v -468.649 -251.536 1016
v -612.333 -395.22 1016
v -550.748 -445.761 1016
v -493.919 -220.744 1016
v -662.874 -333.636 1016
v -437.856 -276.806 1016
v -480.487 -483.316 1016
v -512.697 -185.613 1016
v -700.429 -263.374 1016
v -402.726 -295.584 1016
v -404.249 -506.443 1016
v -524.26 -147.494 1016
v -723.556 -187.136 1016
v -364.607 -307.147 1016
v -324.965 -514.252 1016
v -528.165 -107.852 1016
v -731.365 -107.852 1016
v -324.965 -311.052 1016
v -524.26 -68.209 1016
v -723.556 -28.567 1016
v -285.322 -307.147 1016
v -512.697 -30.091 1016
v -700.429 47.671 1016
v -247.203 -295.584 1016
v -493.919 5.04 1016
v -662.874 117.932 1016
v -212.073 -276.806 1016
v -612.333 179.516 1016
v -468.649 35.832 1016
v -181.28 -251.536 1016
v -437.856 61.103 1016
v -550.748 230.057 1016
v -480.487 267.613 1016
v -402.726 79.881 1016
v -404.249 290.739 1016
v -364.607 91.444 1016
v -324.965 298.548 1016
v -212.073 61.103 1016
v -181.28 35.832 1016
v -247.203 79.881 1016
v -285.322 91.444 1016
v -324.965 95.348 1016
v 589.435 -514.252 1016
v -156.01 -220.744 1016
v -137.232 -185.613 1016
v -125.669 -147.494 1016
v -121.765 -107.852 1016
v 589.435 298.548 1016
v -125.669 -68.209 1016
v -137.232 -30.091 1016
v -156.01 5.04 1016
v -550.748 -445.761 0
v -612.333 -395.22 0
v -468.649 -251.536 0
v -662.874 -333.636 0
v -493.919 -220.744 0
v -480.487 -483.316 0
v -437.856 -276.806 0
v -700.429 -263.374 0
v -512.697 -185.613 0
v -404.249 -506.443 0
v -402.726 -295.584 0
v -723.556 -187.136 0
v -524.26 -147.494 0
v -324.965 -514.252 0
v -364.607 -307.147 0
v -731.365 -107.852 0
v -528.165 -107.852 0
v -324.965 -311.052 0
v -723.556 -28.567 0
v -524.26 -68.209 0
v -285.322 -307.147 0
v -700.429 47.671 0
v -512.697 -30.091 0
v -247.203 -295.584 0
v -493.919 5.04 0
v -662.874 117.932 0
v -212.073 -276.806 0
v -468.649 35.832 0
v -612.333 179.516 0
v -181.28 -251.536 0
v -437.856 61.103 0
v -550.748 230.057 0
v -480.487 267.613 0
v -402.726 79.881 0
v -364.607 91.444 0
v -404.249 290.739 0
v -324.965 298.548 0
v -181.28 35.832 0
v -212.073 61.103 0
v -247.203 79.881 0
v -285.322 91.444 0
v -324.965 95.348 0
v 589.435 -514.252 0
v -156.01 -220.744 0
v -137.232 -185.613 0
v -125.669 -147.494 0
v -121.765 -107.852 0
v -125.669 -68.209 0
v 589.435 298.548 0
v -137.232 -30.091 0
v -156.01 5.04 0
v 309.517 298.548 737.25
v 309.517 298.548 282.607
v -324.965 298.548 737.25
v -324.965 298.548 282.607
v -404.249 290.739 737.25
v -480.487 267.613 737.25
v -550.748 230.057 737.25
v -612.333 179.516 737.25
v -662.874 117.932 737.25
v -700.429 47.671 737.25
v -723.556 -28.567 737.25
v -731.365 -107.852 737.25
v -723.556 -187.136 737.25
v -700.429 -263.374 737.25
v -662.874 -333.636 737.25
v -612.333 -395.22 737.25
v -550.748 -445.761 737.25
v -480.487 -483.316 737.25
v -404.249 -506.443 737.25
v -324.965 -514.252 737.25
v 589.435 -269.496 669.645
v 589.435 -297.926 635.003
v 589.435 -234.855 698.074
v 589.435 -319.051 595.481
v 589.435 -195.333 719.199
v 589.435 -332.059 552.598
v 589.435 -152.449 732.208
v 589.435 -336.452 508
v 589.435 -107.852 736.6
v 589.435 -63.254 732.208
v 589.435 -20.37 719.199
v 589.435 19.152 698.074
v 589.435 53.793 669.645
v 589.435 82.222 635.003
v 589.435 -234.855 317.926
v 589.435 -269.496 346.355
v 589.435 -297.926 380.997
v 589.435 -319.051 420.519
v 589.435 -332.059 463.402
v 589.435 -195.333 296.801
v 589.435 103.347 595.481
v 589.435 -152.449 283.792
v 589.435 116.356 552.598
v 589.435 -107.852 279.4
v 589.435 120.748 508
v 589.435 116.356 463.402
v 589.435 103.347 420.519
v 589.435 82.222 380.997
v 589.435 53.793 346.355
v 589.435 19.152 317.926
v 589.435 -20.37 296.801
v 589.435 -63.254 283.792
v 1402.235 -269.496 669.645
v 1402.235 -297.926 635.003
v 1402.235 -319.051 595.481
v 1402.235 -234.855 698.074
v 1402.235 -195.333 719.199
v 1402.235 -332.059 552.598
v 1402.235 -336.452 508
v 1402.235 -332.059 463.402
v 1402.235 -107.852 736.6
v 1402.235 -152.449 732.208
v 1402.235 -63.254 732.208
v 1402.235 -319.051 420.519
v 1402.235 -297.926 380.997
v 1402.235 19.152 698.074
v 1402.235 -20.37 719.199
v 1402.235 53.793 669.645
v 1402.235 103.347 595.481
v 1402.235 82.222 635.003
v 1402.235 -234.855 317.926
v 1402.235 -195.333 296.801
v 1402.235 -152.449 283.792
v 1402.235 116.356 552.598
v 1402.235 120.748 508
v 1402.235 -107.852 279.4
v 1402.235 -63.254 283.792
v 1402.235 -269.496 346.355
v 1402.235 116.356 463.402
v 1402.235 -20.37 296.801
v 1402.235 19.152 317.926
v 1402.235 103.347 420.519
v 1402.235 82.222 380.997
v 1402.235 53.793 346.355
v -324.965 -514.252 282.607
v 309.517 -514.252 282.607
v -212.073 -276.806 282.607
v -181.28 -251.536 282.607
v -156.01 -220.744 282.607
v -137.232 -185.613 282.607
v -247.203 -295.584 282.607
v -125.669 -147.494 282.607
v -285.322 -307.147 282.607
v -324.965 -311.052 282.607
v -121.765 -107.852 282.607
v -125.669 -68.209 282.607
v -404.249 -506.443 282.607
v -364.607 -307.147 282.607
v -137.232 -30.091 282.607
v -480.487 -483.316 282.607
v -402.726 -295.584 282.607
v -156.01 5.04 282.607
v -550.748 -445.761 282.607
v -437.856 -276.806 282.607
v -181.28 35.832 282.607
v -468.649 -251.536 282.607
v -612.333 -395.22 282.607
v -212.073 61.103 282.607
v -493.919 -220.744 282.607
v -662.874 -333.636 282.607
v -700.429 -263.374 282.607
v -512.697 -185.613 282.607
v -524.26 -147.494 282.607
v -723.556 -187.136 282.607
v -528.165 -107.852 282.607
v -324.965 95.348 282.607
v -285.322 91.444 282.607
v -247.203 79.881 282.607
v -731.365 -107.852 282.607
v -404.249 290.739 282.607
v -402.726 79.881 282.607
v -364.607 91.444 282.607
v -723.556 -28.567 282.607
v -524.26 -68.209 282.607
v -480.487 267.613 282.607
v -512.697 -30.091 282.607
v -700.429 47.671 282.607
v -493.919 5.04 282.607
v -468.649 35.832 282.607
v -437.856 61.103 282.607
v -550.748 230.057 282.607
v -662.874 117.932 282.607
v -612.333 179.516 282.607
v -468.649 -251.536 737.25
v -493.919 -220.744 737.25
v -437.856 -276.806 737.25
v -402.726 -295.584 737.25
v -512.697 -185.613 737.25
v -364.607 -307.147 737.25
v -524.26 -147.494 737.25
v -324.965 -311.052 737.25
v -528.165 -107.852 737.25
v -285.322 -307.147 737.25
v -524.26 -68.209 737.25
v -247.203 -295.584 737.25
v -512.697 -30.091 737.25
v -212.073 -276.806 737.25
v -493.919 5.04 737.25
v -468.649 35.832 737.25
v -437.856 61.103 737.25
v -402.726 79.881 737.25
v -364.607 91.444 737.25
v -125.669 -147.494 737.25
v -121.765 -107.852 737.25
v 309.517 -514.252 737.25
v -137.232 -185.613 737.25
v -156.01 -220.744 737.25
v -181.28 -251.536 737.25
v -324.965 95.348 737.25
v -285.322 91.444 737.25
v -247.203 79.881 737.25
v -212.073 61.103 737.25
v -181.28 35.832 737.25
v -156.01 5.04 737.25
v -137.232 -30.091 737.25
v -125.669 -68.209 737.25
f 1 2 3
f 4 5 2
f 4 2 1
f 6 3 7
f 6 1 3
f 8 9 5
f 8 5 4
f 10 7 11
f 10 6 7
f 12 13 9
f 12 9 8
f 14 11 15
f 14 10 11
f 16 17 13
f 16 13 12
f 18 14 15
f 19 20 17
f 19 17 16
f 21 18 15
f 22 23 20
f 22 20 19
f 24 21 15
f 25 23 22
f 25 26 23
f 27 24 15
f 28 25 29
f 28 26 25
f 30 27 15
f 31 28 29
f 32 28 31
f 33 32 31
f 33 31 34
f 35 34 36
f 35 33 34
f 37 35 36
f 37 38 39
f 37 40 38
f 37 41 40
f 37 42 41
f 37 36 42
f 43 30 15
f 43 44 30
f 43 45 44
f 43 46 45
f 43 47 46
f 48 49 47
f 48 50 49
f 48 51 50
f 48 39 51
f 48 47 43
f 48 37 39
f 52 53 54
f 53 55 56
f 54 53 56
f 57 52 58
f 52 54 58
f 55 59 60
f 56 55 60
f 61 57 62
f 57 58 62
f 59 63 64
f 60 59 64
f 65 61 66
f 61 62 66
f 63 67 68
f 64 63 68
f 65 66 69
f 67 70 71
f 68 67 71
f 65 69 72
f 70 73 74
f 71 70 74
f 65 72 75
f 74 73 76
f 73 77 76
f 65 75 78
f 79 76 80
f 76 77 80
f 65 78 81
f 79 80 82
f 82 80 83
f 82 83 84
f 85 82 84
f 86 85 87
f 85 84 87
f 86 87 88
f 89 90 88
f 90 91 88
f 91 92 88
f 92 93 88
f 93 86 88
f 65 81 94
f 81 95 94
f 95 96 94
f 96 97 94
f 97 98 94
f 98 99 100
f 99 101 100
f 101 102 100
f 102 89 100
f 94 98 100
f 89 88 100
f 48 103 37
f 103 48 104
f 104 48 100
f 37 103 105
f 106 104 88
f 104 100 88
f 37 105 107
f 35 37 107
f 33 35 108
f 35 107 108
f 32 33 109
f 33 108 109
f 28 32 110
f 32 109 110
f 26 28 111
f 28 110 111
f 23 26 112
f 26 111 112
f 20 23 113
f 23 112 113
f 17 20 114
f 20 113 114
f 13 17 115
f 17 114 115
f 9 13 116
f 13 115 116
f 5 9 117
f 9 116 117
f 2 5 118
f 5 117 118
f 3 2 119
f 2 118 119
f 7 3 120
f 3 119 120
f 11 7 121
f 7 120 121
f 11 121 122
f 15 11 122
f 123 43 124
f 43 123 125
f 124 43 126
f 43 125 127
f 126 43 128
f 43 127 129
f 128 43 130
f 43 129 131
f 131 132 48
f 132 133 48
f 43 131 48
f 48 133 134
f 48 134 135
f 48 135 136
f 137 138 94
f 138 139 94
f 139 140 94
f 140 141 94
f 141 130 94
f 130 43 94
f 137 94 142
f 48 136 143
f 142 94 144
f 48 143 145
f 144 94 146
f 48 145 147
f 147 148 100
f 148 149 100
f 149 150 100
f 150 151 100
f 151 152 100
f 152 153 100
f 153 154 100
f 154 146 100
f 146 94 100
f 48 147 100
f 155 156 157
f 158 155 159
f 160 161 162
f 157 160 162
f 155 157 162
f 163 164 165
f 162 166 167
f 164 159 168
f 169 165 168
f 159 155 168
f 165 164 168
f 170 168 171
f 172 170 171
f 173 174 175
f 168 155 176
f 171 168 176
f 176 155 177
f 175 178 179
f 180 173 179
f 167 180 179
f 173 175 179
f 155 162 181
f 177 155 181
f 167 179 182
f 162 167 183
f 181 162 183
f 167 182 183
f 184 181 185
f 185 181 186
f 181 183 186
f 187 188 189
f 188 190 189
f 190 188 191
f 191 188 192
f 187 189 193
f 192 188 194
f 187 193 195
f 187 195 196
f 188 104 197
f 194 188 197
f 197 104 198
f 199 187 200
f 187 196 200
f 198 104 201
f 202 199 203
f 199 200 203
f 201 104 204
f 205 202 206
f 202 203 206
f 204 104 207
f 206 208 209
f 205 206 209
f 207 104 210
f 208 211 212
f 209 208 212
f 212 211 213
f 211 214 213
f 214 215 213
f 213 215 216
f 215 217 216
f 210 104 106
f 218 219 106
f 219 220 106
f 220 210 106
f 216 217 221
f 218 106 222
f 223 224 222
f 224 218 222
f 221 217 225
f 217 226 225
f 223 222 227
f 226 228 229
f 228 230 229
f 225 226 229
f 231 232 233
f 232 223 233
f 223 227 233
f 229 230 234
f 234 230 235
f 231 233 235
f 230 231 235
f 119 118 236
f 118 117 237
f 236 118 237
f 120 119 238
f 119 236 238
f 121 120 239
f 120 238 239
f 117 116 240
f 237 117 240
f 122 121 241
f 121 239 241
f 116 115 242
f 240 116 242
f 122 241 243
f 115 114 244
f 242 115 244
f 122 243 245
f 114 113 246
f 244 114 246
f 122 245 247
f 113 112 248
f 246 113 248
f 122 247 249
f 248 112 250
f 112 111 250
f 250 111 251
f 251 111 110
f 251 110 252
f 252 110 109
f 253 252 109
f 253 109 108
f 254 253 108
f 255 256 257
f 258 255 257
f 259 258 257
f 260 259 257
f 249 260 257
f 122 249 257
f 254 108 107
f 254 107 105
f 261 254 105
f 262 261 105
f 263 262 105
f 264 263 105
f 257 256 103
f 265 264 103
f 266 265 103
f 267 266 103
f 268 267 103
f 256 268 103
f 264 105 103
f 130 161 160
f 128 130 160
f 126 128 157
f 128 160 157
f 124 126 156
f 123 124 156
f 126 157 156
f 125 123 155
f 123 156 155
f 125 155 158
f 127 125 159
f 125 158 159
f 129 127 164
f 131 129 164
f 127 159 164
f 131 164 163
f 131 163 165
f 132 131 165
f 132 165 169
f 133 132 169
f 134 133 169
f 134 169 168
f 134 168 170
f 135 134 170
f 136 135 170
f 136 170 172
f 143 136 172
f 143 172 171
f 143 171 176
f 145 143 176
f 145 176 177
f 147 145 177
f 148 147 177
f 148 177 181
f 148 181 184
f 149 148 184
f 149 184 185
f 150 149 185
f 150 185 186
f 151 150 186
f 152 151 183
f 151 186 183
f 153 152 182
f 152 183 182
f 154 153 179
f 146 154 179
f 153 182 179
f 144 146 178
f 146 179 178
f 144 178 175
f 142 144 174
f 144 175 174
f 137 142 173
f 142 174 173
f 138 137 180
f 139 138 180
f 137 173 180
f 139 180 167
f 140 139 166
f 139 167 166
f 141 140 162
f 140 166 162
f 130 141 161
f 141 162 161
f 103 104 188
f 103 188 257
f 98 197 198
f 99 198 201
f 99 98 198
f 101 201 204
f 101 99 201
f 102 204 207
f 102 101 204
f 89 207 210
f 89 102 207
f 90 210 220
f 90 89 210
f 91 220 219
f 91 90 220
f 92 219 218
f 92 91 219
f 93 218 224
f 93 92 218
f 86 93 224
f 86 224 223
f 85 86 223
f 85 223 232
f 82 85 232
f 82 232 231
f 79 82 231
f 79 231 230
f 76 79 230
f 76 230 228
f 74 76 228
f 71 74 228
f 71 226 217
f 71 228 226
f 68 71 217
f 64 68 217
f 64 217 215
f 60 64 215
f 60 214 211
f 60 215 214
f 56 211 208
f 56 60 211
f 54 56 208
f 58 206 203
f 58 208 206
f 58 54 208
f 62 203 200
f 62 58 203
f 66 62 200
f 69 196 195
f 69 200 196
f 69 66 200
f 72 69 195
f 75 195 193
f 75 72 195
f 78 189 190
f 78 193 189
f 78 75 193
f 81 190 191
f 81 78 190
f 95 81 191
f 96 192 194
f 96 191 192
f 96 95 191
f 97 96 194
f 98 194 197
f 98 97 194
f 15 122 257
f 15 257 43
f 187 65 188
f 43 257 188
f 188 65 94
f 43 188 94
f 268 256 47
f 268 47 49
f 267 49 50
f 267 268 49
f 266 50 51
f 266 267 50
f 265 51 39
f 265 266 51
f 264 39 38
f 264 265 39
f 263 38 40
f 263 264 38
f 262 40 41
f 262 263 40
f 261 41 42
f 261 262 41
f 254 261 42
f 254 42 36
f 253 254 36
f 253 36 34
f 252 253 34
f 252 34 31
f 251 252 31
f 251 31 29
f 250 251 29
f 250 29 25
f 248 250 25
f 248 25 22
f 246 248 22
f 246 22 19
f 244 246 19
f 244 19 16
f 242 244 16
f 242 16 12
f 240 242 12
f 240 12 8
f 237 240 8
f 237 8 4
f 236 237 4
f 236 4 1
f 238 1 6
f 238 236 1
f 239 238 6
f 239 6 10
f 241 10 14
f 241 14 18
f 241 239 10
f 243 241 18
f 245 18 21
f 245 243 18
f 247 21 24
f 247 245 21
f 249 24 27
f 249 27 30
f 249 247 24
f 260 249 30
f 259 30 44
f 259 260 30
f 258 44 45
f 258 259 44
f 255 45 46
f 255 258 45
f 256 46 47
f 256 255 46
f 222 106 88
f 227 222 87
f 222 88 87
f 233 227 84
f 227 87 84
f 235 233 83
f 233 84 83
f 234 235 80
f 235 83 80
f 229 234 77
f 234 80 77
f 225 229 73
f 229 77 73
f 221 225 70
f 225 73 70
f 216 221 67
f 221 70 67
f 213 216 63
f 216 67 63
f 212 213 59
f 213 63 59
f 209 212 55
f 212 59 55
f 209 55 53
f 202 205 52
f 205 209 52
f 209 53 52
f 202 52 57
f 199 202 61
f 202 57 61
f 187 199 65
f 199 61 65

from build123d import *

# Parameters (mm, degrees)
F0_R     = 203.2
F0_W     = 812.8
F0_H     = 457.2
F1_DEPTH = 1016
F2_W     = 634.4814898748
F2_H     = 454.6432495117
F3_DEPTH = 812.801
F4_W     = 457.2
F4_H     = 279.4
F5_DEPTH = 812.8
F7_DEPTH = 812.8


with BuildPart() as f1:
    # F0 (on Top) → F1 (new body)
    with BuildSketch(Plane.XY):
        with BuildLine():
            Line((589.4354466658, 298.5482140541), (-324.9645533342, 298.5482140541))
            ThreePointArc((-324.9645533342, 298.5482140541), (-731.3645533342, -107.8517859459), (-324.9645533342, -514.2517859459))
            Line((-324.9645533342, -514.2517859459), (589.4354466658, -514.2517859459))
            Line((589.4354466658, -514.2517859459), (589.4354466658, -336.4517859459))
            Line((589.4354466658, -336.4517859459), (589.4354466658, 120.7482140541))
            Line((589.4354466658, 120.7482140541), (589.4354466658, 298.5482140541))
        make_face()
        with Locations((-324.9645533342, -107.8517859459)):
            Circle(F0_R, mode=Mode.SUBTRACT)
        with Locations((995.8354466658, -107.8517859459)):
            Rectangle(F0_W, F0_H)
    extrude(amount=F1_DEPTH)

    # F2 (on face) → F3 (cut, through all)
    with BuildSketch(Plane(origin=(0, 298.5482140541, 0), x_dir=(-1, 0, 0), z_dir=(0, 1, 0))):
        with Locations((7.7238083968, 509.9283456802)):
            Rectangle(F2_W, F2_H)
        Polygon((324.9645533342, 737.2499704361), (324.9645533342, 282.6067209244), (821.0112452507, 282.6067209244), (892.6659226418, 737.2499704361), align=None)
    extrude(amount=-F3_DEPTH, mode=Mode.SUBTRACT)

    # F4 (on face) → F5 (cut)
    with BuildSketch(Plane.YZ.offset(1402.2354466658)):
        with Locations((-107.8517859459, 876.3)):
            Rectangle(F4_W, F4_H)
        with Locations((-107.8517859459, 139.7)):
            Rectangle(F4_W, F4_H)
    extrude(amount=-F5_DEPTH, mode=Mode.SUBTRACT)

    # F6 (on face) → F7 (cut)
    with BuildSketch(Plane.YZ.offset(1402.2354466658)):
        with BuildLine():
            Line((120.7482140541, 736.6), (-107.8517859459, 736.6))
            ThreePointArc((-107.8517859459, 736.6), (53.7928242334, 669.6446101792), (120.7482140541, 508))
            Line((120.7482140541, 508), (120.7482140541, 736.6))
        make_face()
        with BuildLine():
            ThreePointArc((120.7482140541, 508), (53.7928242333, 346.3553898207), (-107.8517859459, 279.4))
            Line((-107.8517859459, 279.4), (120.7482140541, 279.4))
            Line((120.7482140541, 279.4), (120.7482140541, 508))
        make_face()
        with BuildLine():
            Line((-336.4517859459, 508), (-336.4517859459, 279.4))
            Line((-336.4517859459, 279.4), (-107.8517859459, 279.4))
            ThreePointArc((-107.8517859459, 279.4), (-269.4963961252, 346.3553898208), (-336.4517859459, 508))
        make_face()
        with BuildLine():
            Line((-336.4517859459, 736.6), (-336.4517859459, 508))
            ThreePointArc((-336.4517859459, 508), (-269.4963961251, 669.6446101792), (-107.8517859459, 736.6))
            Line((-107.8517859459, 736.6), (-336.4517859459, 736.6))
        make_face()
    extrude(amount=-F7_DEPTH, mode=Mode.SUBTRACT)


solid = f1.part
